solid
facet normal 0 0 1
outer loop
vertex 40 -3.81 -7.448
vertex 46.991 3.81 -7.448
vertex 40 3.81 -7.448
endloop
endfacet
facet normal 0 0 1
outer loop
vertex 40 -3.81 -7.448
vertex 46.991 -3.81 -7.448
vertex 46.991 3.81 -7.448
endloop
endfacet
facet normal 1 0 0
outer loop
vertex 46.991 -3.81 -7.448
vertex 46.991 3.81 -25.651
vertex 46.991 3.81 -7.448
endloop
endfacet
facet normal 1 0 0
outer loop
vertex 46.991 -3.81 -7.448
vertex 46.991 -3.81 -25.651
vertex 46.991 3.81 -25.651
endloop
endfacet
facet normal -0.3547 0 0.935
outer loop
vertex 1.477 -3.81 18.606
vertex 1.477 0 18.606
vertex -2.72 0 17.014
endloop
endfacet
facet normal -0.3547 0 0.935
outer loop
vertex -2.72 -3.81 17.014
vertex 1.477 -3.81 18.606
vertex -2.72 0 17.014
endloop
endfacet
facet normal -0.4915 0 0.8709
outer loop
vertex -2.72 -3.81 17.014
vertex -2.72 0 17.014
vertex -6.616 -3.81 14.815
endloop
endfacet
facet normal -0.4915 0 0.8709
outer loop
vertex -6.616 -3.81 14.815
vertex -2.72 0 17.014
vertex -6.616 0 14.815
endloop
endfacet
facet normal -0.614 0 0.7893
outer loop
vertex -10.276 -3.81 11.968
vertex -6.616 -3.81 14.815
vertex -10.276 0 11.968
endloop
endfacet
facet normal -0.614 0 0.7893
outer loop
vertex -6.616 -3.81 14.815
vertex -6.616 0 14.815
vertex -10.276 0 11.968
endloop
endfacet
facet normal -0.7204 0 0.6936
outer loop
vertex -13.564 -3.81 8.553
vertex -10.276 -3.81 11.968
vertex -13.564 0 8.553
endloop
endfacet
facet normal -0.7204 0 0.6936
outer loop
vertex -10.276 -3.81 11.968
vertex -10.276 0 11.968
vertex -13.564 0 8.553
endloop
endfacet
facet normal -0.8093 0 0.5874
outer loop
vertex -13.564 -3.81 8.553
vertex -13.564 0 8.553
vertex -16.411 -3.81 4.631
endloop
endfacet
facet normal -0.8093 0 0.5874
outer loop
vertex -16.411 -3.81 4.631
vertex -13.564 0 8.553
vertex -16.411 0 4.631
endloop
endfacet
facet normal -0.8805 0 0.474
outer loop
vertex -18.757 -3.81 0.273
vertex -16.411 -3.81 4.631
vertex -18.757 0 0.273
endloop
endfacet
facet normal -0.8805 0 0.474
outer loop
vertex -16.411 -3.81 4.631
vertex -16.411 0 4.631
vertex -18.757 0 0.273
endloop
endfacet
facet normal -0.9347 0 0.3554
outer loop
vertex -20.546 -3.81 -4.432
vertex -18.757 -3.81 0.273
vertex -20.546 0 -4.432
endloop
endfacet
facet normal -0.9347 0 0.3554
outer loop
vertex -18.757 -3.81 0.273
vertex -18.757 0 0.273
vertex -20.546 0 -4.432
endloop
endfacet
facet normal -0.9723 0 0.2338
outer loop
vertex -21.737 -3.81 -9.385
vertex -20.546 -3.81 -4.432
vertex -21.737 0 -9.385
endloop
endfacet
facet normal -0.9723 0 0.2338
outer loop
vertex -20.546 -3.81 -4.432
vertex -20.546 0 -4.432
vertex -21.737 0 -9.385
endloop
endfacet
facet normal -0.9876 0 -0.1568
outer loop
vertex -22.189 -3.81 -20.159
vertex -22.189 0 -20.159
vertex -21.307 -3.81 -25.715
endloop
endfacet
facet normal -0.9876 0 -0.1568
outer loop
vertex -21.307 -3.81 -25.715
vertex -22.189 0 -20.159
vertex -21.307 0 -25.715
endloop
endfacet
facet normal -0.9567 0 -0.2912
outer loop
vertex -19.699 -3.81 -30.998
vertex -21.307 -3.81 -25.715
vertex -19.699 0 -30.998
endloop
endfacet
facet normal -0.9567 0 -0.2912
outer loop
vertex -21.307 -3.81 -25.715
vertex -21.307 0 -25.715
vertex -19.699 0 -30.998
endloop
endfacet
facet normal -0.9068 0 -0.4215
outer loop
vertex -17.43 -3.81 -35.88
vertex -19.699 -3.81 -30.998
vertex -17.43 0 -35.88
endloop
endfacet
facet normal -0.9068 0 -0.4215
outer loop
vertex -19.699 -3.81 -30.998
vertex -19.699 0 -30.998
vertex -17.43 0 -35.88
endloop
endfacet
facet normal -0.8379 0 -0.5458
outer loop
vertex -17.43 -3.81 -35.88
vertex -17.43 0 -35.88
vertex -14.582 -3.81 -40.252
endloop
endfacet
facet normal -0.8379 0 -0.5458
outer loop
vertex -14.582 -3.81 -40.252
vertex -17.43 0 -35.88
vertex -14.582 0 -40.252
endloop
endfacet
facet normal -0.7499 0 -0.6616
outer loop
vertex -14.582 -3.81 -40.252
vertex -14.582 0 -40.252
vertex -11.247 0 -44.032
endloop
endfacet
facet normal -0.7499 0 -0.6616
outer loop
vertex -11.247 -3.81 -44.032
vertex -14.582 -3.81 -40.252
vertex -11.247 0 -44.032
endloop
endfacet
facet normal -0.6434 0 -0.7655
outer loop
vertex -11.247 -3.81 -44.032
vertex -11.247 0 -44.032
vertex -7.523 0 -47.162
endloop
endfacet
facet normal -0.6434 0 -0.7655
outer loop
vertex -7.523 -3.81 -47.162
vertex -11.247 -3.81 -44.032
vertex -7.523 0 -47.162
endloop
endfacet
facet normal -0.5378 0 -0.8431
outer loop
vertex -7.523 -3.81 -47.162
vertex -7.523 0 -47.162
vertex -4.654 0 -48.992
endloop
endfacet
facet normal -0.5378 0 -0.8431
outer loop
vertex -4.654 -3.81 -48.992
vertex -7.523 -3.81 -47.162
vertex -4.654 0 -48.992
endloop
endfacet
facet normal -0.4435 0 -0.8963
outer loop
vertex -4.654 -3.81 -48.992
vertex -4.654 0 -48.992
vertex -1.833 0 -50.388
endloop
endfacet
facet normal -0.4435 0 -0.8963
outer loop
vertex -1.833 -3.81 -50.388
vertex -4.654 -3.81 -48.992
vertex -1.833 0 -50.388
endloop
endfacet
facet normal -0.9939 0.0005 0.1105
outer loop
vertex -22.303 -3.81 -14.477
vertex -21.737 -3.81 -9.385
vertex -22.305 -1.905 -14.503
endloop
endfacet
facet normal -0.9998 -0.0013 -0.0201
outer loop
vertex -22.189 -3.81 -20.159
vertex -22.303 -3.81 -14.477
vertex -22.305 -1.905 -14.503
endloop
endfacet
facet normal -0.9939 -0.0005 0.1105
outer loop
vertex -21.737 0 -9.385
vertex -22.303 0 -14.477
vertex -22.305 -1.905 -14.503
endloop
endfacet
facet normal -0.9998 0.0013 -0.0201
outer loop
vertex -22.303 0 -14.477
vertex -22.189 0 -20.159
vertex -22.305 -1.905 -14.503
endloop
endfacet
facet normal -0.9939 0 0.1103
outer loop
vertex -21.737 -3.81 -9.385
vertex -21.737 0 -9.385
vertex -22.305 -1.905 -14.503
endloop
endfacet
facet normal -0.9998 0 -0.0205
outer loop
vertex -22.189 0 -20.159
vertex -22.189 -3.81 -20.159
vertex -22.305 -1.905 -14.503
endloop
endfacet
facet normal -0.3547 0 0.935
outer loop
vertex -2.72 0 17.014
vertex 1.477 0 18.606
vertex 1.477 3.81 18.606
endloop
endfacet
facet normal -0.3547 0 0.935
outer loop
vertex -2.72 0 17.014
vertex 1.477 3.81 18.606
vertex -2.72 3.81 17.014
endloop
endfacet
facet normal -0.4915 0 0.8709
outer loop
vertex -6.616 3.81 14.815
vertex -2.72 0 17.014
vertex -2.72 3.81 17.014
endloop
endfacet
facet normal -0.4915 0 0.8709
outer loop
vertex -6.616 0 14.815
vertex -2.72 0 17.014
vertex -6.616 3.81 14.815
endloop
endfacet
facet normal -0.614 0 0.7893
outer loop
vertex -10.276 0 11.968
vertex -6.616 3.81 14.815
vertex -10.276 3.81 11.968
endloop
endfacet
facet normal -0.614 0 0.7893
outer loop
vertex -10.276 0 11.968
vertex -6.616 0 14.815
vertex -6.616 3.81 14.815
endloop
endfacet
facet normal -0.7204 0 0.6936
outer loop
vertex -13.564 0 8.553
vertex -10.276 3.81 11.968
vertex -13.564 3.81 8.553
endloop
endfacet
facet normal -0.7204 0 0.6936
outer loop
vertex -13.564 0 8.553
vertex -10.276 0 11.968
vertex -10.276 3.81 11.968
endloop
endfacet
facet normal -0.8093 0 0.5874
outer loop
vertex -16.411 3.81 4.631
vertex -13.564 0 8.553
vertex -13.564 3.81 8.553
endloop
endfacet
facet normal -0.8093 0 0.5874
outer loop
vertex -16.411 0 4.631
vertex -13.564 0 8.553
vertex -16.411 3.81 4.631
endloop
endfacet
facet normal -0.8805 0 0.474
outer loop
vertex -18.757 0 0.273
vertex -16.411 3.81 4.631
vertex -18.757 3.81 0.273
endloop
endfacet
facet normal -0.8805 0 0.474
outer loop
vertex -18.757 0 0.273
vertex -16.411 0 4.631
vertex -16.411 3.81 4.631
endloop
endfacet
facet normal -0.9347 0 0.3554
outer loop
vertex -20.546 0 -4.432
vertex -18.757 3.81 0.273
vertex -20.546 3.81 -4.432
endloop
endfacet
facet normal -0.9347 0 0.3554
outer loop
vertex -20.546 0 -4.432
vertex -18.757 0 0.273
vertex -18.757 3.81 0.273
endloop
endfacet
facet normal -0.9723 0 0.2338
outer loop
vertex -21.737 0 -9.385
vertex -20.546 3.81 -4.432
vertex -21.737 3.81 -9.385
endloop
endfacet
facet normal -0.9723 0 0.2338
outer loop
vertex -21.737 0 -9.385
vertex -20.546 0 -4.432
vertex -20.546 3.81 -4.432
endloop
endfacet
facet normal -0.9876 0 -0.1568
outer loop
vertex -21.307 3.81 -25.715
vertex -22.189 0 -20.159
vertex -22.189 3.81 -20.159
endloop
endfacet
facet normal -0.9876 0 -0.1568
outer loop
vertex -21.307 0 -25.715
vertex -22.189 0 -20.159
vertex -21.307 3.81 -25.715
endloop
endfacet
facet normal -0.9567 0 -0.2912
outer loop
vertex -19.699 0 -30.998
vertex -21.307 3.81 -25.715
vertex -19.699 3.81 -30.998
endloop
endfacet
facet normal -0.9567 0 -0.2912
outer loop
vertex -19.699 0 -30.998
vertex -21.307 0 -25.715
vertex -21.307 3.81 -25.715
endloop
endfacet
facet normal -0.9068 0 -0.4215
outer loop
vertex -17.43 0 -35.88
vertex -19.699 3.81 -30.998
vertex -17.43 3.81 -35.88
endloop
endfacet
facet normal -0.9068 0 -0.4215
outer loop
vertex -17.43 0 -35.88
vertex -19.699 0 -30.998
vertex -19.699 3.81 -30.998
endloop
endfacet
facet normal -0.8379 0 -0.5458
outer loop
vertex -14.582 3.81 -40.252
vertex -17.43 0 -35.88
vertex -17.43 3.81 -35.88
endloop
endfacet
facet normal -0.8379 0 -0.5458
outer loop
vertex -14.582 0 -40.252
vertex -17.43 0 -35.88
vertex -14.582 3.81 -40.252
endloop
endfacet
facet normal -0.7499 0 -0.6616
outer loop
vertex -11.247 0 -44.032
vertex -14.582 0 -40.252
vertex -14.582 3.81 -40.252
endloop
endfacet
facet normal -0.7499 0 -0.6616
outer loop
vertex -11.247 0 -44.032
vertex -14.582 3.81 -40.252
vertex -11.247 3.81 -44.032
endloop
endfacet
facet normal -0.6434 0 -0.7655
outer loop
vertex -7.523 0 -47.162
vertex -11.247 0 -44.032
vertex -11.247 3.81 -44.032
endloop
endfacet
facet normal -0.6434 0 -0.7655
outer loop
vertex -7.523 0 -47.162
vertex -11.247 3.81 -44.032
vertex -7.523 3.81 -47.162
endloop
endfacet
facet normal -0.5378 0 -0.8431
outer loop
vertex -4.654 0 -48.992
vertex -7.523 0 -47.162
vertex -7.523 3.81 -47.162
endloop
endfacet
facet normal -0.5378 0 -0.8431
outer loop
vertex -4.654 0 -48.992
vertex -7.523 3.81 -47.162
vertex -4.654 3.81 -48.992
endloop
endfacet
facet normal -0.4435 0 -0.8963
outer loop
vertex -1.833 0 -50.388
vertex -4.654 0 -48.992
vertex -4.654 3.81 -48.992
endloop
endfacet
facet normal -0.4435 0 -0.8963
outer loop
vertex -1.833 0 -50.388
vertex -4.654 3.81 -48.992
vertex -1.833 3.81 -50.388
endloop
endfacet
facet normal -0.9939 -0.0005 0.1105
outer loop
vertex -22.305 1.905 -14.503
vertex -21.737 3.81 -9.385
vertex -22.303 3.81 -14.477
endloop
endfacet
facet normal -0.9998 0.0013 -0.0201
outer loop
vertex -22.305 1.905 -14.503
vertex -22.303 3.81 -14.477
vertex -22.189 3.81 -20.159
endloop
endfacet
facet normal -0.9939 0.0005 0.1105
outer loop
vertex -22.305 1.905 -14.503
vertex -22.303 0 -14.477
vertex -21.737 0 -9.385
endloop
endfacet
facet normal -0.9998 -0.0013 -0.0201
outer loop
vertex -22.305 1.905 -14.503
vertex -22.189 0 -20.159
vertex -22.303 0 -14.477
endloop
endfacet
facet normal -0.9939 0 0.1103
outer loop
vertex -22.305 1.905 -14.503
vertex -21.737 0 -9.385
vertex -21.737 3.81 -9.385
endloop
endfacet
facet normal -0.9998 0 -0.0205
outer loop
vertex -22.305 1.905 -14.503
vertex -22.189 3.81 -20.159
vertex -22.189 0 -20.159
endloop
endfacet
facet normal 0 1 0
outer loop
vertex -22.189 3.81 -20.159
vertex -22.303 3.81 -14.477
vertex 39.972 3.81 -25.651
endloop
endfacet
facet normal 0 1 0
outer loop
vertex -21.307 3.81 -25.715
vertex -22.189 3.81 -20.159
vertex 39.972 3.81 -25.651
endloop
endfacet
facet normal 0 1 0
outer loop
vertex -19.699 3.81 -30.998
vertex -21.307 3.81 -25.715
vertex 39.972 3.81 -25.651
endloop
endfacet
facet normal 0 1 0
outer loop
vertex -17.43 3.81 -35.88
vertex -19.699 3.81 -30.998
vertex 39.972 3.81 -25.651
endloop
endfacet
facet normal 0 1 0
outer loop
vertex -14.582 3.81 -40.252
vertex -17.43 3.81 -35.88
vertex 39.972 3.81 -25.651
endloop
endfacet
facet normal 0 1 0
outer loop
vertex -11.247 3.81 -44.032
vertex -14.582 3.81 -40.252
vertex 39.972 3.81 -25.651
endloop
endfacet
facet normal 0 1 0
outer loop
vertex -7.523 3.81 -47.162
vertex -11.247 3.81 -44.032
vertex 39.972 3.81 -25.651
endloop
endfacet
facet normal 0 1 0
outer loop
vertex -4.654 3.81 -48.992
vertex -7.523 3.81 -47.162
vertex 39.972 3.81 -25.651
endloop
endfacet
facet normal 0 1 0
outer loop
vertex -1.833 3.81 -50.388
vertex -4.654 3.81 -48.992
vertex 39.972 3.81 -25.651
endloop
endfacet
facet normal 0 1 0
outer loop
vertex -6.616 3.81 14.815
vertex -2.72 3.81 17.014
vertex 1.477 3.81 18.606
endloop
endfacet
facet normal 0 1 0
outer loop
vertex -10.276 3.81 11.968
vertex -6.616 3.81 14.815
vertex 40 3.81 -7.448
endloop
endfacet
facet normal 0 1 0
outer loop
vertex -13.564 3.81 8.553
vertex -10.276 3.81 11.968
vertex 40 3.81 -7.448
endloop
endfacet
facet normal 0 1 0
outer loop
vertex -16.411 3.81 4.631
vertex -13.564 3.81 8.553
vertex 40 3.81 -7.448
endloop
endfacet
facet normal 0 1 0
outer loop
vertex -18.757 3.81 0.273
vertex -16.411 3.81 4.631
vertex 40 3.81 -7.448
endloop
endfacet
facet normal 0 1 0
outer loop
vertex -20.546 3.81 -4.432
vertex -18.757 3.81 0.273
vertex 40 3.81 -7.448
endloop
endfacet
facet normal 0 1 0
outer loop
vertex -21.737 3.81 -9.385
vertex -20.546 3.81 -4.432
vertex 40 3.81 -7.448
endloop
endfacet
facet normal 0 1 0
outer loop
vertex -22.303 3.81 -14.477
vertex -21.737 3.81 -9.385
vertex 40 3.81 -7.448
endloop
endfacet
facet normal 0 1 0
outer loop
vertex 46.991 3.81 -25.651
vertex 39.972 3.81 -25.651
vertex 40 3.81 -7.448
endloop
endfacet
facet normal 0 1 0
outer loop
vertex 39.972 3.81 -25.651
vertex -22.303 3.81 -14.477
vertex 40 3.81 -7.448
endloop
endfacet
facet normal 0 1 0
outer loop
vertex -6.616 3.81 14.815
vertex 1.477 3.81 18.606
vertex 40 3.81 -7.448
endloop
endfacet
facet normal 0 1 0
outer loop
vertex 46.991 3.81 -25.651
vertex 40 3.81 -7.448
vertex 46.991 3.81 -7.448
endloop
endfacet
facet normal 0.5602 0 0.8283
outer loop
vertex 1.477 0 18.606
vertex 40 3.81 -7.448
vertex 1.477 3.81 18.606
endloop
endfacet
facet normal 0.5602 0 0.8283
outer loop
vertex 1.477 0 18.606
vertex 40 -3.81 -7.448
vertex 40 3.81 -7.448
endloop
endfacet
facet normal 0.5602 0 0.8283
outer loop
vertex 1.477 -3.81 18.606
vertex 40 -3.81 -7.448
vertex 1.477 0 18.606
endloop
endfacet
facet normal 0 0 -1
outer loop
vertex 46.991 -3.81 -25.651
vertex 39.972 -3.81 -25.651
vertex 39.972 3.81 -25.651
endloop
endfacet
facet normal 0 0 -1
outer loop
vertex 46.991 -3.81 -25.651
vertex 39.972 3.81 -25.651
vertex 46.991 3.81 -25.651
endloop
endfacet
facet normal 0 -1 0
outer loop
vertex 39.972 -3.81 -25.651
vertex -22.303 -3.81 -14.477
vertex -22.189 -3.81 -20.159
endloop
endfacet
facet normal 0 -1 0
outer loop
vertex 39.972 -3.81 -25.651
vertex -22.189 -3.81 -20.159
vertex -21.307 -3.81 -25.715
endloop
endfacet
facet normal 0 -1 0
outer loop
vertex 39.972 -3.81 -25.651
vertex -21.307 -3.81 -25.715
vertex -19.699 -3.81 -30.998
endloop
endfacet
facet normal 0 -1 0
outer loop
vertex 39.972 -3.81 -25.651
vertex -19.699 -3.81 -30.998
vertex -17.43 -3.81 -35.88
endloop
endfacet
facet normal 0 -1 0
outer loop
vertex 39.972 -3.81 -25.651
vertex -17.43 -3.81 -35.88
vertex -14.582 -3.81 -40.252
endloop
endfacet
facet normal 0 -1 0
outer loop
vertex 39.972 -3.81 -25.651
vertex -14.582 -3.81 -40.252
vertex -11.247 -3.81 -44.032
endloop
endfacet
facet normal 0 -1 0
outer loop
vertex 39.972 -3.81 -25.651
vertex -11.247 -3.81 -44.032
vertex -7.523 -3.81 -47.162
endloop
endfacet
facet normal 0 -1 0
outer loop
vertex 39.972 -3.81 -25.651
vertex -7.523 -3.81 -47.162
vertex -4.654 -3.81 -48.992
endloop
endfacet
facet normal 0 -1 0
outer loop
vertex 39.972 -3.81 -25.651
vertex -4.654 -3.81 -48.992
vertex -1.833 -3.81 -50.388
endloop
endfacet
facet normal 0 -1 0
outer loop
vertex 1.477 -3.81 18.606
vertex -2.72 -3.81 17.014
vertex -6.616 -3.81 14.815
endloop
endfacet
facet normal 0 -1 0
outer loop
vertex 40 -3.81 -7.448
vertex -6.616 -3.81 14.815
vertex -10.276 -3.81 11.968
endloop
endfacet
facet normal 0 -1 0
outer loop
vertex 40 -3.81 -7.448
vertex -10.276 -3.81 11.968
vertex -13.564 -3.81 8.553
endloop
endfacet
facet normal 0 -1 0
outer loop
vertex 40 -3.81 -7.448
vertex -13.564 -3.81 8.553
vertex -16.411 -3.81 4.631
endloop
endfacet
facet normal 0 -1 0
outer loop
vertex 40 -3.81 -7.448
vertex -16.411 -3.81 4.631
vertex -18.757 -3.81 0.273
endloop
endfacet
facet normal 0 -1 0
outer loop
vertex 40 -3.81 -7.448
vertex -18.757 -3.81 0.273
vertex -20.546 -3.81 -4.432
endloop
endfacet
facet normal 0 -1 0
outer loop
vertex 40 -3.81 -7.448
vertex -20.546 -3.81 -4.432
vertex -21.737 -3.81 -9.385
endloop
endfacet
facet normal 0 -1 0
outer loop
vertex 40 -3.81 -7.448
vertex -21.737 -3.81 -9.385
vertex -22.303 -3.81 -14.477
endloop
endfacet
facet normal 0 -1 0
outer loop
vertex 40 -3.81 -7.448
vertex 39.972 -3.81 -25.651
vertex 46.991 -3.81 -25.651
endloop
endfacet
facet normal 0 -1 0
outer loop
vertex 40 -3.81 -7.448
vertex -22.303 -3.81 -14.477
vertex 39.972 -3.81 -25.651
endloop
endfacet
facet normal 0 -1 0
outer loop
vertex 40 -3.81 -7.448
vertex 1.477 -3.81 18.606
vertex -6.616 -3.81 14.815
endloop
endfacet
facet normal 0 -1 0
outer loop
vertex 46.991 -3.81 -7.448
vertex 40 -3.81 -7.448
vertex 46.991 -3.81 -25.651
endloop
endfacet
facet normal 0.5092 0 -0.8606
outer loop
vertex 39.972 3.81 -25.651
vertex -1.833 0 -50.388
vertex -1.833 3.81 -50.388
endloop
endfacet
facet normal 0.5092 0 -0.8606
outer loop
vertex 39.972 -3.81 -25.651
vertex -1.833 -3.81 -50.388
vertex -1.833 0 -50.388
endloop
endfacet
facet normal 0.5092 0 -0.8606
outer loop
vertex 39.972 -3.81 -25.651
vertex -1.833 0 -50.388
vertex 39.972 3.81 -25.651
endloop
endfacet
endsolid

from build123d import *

# Parameters (mm, degrees)
F1_DEPTH = 3.81


with BuildPart() as f1:
    # F0 (on Front) → F1 (new body, symmetric)
    with BuildSketch(Plane.XZ):
        with BuildLine():
            Line((39.999735067, -7.4482769705), (1.4772535285, 18.6058512943))
            add(Edge.make_bspline(
                [(1.4772535285, 18.6058512943), (-95.952662812, -9.8829154217), (-1.8328876207, -50.3882795617)],
                knots=[3.3919385935, 3.3919385935, 3.3919385935, 5.9232263676, 5.9232263676, 5.9232263676], degree=2, weights=[1, 0.3004385759, 1]))
            Line((-1.8328876207, -50.3882795617), (39.9715108869, -25.6507564336))
            Line((39.9715108869, -25.6507564336), (46.9909198582, -25.6507564336))
            Line((46.9909198582, -25.6507564336), (46.9909198582, -7.4482769705))
            Line((46.9909198582, -7.4482769705), (39.999735067, -7.4482769705))
        make_face()
    extrude(amount=F1_DEPTH, both=True)


solid = f1.part
